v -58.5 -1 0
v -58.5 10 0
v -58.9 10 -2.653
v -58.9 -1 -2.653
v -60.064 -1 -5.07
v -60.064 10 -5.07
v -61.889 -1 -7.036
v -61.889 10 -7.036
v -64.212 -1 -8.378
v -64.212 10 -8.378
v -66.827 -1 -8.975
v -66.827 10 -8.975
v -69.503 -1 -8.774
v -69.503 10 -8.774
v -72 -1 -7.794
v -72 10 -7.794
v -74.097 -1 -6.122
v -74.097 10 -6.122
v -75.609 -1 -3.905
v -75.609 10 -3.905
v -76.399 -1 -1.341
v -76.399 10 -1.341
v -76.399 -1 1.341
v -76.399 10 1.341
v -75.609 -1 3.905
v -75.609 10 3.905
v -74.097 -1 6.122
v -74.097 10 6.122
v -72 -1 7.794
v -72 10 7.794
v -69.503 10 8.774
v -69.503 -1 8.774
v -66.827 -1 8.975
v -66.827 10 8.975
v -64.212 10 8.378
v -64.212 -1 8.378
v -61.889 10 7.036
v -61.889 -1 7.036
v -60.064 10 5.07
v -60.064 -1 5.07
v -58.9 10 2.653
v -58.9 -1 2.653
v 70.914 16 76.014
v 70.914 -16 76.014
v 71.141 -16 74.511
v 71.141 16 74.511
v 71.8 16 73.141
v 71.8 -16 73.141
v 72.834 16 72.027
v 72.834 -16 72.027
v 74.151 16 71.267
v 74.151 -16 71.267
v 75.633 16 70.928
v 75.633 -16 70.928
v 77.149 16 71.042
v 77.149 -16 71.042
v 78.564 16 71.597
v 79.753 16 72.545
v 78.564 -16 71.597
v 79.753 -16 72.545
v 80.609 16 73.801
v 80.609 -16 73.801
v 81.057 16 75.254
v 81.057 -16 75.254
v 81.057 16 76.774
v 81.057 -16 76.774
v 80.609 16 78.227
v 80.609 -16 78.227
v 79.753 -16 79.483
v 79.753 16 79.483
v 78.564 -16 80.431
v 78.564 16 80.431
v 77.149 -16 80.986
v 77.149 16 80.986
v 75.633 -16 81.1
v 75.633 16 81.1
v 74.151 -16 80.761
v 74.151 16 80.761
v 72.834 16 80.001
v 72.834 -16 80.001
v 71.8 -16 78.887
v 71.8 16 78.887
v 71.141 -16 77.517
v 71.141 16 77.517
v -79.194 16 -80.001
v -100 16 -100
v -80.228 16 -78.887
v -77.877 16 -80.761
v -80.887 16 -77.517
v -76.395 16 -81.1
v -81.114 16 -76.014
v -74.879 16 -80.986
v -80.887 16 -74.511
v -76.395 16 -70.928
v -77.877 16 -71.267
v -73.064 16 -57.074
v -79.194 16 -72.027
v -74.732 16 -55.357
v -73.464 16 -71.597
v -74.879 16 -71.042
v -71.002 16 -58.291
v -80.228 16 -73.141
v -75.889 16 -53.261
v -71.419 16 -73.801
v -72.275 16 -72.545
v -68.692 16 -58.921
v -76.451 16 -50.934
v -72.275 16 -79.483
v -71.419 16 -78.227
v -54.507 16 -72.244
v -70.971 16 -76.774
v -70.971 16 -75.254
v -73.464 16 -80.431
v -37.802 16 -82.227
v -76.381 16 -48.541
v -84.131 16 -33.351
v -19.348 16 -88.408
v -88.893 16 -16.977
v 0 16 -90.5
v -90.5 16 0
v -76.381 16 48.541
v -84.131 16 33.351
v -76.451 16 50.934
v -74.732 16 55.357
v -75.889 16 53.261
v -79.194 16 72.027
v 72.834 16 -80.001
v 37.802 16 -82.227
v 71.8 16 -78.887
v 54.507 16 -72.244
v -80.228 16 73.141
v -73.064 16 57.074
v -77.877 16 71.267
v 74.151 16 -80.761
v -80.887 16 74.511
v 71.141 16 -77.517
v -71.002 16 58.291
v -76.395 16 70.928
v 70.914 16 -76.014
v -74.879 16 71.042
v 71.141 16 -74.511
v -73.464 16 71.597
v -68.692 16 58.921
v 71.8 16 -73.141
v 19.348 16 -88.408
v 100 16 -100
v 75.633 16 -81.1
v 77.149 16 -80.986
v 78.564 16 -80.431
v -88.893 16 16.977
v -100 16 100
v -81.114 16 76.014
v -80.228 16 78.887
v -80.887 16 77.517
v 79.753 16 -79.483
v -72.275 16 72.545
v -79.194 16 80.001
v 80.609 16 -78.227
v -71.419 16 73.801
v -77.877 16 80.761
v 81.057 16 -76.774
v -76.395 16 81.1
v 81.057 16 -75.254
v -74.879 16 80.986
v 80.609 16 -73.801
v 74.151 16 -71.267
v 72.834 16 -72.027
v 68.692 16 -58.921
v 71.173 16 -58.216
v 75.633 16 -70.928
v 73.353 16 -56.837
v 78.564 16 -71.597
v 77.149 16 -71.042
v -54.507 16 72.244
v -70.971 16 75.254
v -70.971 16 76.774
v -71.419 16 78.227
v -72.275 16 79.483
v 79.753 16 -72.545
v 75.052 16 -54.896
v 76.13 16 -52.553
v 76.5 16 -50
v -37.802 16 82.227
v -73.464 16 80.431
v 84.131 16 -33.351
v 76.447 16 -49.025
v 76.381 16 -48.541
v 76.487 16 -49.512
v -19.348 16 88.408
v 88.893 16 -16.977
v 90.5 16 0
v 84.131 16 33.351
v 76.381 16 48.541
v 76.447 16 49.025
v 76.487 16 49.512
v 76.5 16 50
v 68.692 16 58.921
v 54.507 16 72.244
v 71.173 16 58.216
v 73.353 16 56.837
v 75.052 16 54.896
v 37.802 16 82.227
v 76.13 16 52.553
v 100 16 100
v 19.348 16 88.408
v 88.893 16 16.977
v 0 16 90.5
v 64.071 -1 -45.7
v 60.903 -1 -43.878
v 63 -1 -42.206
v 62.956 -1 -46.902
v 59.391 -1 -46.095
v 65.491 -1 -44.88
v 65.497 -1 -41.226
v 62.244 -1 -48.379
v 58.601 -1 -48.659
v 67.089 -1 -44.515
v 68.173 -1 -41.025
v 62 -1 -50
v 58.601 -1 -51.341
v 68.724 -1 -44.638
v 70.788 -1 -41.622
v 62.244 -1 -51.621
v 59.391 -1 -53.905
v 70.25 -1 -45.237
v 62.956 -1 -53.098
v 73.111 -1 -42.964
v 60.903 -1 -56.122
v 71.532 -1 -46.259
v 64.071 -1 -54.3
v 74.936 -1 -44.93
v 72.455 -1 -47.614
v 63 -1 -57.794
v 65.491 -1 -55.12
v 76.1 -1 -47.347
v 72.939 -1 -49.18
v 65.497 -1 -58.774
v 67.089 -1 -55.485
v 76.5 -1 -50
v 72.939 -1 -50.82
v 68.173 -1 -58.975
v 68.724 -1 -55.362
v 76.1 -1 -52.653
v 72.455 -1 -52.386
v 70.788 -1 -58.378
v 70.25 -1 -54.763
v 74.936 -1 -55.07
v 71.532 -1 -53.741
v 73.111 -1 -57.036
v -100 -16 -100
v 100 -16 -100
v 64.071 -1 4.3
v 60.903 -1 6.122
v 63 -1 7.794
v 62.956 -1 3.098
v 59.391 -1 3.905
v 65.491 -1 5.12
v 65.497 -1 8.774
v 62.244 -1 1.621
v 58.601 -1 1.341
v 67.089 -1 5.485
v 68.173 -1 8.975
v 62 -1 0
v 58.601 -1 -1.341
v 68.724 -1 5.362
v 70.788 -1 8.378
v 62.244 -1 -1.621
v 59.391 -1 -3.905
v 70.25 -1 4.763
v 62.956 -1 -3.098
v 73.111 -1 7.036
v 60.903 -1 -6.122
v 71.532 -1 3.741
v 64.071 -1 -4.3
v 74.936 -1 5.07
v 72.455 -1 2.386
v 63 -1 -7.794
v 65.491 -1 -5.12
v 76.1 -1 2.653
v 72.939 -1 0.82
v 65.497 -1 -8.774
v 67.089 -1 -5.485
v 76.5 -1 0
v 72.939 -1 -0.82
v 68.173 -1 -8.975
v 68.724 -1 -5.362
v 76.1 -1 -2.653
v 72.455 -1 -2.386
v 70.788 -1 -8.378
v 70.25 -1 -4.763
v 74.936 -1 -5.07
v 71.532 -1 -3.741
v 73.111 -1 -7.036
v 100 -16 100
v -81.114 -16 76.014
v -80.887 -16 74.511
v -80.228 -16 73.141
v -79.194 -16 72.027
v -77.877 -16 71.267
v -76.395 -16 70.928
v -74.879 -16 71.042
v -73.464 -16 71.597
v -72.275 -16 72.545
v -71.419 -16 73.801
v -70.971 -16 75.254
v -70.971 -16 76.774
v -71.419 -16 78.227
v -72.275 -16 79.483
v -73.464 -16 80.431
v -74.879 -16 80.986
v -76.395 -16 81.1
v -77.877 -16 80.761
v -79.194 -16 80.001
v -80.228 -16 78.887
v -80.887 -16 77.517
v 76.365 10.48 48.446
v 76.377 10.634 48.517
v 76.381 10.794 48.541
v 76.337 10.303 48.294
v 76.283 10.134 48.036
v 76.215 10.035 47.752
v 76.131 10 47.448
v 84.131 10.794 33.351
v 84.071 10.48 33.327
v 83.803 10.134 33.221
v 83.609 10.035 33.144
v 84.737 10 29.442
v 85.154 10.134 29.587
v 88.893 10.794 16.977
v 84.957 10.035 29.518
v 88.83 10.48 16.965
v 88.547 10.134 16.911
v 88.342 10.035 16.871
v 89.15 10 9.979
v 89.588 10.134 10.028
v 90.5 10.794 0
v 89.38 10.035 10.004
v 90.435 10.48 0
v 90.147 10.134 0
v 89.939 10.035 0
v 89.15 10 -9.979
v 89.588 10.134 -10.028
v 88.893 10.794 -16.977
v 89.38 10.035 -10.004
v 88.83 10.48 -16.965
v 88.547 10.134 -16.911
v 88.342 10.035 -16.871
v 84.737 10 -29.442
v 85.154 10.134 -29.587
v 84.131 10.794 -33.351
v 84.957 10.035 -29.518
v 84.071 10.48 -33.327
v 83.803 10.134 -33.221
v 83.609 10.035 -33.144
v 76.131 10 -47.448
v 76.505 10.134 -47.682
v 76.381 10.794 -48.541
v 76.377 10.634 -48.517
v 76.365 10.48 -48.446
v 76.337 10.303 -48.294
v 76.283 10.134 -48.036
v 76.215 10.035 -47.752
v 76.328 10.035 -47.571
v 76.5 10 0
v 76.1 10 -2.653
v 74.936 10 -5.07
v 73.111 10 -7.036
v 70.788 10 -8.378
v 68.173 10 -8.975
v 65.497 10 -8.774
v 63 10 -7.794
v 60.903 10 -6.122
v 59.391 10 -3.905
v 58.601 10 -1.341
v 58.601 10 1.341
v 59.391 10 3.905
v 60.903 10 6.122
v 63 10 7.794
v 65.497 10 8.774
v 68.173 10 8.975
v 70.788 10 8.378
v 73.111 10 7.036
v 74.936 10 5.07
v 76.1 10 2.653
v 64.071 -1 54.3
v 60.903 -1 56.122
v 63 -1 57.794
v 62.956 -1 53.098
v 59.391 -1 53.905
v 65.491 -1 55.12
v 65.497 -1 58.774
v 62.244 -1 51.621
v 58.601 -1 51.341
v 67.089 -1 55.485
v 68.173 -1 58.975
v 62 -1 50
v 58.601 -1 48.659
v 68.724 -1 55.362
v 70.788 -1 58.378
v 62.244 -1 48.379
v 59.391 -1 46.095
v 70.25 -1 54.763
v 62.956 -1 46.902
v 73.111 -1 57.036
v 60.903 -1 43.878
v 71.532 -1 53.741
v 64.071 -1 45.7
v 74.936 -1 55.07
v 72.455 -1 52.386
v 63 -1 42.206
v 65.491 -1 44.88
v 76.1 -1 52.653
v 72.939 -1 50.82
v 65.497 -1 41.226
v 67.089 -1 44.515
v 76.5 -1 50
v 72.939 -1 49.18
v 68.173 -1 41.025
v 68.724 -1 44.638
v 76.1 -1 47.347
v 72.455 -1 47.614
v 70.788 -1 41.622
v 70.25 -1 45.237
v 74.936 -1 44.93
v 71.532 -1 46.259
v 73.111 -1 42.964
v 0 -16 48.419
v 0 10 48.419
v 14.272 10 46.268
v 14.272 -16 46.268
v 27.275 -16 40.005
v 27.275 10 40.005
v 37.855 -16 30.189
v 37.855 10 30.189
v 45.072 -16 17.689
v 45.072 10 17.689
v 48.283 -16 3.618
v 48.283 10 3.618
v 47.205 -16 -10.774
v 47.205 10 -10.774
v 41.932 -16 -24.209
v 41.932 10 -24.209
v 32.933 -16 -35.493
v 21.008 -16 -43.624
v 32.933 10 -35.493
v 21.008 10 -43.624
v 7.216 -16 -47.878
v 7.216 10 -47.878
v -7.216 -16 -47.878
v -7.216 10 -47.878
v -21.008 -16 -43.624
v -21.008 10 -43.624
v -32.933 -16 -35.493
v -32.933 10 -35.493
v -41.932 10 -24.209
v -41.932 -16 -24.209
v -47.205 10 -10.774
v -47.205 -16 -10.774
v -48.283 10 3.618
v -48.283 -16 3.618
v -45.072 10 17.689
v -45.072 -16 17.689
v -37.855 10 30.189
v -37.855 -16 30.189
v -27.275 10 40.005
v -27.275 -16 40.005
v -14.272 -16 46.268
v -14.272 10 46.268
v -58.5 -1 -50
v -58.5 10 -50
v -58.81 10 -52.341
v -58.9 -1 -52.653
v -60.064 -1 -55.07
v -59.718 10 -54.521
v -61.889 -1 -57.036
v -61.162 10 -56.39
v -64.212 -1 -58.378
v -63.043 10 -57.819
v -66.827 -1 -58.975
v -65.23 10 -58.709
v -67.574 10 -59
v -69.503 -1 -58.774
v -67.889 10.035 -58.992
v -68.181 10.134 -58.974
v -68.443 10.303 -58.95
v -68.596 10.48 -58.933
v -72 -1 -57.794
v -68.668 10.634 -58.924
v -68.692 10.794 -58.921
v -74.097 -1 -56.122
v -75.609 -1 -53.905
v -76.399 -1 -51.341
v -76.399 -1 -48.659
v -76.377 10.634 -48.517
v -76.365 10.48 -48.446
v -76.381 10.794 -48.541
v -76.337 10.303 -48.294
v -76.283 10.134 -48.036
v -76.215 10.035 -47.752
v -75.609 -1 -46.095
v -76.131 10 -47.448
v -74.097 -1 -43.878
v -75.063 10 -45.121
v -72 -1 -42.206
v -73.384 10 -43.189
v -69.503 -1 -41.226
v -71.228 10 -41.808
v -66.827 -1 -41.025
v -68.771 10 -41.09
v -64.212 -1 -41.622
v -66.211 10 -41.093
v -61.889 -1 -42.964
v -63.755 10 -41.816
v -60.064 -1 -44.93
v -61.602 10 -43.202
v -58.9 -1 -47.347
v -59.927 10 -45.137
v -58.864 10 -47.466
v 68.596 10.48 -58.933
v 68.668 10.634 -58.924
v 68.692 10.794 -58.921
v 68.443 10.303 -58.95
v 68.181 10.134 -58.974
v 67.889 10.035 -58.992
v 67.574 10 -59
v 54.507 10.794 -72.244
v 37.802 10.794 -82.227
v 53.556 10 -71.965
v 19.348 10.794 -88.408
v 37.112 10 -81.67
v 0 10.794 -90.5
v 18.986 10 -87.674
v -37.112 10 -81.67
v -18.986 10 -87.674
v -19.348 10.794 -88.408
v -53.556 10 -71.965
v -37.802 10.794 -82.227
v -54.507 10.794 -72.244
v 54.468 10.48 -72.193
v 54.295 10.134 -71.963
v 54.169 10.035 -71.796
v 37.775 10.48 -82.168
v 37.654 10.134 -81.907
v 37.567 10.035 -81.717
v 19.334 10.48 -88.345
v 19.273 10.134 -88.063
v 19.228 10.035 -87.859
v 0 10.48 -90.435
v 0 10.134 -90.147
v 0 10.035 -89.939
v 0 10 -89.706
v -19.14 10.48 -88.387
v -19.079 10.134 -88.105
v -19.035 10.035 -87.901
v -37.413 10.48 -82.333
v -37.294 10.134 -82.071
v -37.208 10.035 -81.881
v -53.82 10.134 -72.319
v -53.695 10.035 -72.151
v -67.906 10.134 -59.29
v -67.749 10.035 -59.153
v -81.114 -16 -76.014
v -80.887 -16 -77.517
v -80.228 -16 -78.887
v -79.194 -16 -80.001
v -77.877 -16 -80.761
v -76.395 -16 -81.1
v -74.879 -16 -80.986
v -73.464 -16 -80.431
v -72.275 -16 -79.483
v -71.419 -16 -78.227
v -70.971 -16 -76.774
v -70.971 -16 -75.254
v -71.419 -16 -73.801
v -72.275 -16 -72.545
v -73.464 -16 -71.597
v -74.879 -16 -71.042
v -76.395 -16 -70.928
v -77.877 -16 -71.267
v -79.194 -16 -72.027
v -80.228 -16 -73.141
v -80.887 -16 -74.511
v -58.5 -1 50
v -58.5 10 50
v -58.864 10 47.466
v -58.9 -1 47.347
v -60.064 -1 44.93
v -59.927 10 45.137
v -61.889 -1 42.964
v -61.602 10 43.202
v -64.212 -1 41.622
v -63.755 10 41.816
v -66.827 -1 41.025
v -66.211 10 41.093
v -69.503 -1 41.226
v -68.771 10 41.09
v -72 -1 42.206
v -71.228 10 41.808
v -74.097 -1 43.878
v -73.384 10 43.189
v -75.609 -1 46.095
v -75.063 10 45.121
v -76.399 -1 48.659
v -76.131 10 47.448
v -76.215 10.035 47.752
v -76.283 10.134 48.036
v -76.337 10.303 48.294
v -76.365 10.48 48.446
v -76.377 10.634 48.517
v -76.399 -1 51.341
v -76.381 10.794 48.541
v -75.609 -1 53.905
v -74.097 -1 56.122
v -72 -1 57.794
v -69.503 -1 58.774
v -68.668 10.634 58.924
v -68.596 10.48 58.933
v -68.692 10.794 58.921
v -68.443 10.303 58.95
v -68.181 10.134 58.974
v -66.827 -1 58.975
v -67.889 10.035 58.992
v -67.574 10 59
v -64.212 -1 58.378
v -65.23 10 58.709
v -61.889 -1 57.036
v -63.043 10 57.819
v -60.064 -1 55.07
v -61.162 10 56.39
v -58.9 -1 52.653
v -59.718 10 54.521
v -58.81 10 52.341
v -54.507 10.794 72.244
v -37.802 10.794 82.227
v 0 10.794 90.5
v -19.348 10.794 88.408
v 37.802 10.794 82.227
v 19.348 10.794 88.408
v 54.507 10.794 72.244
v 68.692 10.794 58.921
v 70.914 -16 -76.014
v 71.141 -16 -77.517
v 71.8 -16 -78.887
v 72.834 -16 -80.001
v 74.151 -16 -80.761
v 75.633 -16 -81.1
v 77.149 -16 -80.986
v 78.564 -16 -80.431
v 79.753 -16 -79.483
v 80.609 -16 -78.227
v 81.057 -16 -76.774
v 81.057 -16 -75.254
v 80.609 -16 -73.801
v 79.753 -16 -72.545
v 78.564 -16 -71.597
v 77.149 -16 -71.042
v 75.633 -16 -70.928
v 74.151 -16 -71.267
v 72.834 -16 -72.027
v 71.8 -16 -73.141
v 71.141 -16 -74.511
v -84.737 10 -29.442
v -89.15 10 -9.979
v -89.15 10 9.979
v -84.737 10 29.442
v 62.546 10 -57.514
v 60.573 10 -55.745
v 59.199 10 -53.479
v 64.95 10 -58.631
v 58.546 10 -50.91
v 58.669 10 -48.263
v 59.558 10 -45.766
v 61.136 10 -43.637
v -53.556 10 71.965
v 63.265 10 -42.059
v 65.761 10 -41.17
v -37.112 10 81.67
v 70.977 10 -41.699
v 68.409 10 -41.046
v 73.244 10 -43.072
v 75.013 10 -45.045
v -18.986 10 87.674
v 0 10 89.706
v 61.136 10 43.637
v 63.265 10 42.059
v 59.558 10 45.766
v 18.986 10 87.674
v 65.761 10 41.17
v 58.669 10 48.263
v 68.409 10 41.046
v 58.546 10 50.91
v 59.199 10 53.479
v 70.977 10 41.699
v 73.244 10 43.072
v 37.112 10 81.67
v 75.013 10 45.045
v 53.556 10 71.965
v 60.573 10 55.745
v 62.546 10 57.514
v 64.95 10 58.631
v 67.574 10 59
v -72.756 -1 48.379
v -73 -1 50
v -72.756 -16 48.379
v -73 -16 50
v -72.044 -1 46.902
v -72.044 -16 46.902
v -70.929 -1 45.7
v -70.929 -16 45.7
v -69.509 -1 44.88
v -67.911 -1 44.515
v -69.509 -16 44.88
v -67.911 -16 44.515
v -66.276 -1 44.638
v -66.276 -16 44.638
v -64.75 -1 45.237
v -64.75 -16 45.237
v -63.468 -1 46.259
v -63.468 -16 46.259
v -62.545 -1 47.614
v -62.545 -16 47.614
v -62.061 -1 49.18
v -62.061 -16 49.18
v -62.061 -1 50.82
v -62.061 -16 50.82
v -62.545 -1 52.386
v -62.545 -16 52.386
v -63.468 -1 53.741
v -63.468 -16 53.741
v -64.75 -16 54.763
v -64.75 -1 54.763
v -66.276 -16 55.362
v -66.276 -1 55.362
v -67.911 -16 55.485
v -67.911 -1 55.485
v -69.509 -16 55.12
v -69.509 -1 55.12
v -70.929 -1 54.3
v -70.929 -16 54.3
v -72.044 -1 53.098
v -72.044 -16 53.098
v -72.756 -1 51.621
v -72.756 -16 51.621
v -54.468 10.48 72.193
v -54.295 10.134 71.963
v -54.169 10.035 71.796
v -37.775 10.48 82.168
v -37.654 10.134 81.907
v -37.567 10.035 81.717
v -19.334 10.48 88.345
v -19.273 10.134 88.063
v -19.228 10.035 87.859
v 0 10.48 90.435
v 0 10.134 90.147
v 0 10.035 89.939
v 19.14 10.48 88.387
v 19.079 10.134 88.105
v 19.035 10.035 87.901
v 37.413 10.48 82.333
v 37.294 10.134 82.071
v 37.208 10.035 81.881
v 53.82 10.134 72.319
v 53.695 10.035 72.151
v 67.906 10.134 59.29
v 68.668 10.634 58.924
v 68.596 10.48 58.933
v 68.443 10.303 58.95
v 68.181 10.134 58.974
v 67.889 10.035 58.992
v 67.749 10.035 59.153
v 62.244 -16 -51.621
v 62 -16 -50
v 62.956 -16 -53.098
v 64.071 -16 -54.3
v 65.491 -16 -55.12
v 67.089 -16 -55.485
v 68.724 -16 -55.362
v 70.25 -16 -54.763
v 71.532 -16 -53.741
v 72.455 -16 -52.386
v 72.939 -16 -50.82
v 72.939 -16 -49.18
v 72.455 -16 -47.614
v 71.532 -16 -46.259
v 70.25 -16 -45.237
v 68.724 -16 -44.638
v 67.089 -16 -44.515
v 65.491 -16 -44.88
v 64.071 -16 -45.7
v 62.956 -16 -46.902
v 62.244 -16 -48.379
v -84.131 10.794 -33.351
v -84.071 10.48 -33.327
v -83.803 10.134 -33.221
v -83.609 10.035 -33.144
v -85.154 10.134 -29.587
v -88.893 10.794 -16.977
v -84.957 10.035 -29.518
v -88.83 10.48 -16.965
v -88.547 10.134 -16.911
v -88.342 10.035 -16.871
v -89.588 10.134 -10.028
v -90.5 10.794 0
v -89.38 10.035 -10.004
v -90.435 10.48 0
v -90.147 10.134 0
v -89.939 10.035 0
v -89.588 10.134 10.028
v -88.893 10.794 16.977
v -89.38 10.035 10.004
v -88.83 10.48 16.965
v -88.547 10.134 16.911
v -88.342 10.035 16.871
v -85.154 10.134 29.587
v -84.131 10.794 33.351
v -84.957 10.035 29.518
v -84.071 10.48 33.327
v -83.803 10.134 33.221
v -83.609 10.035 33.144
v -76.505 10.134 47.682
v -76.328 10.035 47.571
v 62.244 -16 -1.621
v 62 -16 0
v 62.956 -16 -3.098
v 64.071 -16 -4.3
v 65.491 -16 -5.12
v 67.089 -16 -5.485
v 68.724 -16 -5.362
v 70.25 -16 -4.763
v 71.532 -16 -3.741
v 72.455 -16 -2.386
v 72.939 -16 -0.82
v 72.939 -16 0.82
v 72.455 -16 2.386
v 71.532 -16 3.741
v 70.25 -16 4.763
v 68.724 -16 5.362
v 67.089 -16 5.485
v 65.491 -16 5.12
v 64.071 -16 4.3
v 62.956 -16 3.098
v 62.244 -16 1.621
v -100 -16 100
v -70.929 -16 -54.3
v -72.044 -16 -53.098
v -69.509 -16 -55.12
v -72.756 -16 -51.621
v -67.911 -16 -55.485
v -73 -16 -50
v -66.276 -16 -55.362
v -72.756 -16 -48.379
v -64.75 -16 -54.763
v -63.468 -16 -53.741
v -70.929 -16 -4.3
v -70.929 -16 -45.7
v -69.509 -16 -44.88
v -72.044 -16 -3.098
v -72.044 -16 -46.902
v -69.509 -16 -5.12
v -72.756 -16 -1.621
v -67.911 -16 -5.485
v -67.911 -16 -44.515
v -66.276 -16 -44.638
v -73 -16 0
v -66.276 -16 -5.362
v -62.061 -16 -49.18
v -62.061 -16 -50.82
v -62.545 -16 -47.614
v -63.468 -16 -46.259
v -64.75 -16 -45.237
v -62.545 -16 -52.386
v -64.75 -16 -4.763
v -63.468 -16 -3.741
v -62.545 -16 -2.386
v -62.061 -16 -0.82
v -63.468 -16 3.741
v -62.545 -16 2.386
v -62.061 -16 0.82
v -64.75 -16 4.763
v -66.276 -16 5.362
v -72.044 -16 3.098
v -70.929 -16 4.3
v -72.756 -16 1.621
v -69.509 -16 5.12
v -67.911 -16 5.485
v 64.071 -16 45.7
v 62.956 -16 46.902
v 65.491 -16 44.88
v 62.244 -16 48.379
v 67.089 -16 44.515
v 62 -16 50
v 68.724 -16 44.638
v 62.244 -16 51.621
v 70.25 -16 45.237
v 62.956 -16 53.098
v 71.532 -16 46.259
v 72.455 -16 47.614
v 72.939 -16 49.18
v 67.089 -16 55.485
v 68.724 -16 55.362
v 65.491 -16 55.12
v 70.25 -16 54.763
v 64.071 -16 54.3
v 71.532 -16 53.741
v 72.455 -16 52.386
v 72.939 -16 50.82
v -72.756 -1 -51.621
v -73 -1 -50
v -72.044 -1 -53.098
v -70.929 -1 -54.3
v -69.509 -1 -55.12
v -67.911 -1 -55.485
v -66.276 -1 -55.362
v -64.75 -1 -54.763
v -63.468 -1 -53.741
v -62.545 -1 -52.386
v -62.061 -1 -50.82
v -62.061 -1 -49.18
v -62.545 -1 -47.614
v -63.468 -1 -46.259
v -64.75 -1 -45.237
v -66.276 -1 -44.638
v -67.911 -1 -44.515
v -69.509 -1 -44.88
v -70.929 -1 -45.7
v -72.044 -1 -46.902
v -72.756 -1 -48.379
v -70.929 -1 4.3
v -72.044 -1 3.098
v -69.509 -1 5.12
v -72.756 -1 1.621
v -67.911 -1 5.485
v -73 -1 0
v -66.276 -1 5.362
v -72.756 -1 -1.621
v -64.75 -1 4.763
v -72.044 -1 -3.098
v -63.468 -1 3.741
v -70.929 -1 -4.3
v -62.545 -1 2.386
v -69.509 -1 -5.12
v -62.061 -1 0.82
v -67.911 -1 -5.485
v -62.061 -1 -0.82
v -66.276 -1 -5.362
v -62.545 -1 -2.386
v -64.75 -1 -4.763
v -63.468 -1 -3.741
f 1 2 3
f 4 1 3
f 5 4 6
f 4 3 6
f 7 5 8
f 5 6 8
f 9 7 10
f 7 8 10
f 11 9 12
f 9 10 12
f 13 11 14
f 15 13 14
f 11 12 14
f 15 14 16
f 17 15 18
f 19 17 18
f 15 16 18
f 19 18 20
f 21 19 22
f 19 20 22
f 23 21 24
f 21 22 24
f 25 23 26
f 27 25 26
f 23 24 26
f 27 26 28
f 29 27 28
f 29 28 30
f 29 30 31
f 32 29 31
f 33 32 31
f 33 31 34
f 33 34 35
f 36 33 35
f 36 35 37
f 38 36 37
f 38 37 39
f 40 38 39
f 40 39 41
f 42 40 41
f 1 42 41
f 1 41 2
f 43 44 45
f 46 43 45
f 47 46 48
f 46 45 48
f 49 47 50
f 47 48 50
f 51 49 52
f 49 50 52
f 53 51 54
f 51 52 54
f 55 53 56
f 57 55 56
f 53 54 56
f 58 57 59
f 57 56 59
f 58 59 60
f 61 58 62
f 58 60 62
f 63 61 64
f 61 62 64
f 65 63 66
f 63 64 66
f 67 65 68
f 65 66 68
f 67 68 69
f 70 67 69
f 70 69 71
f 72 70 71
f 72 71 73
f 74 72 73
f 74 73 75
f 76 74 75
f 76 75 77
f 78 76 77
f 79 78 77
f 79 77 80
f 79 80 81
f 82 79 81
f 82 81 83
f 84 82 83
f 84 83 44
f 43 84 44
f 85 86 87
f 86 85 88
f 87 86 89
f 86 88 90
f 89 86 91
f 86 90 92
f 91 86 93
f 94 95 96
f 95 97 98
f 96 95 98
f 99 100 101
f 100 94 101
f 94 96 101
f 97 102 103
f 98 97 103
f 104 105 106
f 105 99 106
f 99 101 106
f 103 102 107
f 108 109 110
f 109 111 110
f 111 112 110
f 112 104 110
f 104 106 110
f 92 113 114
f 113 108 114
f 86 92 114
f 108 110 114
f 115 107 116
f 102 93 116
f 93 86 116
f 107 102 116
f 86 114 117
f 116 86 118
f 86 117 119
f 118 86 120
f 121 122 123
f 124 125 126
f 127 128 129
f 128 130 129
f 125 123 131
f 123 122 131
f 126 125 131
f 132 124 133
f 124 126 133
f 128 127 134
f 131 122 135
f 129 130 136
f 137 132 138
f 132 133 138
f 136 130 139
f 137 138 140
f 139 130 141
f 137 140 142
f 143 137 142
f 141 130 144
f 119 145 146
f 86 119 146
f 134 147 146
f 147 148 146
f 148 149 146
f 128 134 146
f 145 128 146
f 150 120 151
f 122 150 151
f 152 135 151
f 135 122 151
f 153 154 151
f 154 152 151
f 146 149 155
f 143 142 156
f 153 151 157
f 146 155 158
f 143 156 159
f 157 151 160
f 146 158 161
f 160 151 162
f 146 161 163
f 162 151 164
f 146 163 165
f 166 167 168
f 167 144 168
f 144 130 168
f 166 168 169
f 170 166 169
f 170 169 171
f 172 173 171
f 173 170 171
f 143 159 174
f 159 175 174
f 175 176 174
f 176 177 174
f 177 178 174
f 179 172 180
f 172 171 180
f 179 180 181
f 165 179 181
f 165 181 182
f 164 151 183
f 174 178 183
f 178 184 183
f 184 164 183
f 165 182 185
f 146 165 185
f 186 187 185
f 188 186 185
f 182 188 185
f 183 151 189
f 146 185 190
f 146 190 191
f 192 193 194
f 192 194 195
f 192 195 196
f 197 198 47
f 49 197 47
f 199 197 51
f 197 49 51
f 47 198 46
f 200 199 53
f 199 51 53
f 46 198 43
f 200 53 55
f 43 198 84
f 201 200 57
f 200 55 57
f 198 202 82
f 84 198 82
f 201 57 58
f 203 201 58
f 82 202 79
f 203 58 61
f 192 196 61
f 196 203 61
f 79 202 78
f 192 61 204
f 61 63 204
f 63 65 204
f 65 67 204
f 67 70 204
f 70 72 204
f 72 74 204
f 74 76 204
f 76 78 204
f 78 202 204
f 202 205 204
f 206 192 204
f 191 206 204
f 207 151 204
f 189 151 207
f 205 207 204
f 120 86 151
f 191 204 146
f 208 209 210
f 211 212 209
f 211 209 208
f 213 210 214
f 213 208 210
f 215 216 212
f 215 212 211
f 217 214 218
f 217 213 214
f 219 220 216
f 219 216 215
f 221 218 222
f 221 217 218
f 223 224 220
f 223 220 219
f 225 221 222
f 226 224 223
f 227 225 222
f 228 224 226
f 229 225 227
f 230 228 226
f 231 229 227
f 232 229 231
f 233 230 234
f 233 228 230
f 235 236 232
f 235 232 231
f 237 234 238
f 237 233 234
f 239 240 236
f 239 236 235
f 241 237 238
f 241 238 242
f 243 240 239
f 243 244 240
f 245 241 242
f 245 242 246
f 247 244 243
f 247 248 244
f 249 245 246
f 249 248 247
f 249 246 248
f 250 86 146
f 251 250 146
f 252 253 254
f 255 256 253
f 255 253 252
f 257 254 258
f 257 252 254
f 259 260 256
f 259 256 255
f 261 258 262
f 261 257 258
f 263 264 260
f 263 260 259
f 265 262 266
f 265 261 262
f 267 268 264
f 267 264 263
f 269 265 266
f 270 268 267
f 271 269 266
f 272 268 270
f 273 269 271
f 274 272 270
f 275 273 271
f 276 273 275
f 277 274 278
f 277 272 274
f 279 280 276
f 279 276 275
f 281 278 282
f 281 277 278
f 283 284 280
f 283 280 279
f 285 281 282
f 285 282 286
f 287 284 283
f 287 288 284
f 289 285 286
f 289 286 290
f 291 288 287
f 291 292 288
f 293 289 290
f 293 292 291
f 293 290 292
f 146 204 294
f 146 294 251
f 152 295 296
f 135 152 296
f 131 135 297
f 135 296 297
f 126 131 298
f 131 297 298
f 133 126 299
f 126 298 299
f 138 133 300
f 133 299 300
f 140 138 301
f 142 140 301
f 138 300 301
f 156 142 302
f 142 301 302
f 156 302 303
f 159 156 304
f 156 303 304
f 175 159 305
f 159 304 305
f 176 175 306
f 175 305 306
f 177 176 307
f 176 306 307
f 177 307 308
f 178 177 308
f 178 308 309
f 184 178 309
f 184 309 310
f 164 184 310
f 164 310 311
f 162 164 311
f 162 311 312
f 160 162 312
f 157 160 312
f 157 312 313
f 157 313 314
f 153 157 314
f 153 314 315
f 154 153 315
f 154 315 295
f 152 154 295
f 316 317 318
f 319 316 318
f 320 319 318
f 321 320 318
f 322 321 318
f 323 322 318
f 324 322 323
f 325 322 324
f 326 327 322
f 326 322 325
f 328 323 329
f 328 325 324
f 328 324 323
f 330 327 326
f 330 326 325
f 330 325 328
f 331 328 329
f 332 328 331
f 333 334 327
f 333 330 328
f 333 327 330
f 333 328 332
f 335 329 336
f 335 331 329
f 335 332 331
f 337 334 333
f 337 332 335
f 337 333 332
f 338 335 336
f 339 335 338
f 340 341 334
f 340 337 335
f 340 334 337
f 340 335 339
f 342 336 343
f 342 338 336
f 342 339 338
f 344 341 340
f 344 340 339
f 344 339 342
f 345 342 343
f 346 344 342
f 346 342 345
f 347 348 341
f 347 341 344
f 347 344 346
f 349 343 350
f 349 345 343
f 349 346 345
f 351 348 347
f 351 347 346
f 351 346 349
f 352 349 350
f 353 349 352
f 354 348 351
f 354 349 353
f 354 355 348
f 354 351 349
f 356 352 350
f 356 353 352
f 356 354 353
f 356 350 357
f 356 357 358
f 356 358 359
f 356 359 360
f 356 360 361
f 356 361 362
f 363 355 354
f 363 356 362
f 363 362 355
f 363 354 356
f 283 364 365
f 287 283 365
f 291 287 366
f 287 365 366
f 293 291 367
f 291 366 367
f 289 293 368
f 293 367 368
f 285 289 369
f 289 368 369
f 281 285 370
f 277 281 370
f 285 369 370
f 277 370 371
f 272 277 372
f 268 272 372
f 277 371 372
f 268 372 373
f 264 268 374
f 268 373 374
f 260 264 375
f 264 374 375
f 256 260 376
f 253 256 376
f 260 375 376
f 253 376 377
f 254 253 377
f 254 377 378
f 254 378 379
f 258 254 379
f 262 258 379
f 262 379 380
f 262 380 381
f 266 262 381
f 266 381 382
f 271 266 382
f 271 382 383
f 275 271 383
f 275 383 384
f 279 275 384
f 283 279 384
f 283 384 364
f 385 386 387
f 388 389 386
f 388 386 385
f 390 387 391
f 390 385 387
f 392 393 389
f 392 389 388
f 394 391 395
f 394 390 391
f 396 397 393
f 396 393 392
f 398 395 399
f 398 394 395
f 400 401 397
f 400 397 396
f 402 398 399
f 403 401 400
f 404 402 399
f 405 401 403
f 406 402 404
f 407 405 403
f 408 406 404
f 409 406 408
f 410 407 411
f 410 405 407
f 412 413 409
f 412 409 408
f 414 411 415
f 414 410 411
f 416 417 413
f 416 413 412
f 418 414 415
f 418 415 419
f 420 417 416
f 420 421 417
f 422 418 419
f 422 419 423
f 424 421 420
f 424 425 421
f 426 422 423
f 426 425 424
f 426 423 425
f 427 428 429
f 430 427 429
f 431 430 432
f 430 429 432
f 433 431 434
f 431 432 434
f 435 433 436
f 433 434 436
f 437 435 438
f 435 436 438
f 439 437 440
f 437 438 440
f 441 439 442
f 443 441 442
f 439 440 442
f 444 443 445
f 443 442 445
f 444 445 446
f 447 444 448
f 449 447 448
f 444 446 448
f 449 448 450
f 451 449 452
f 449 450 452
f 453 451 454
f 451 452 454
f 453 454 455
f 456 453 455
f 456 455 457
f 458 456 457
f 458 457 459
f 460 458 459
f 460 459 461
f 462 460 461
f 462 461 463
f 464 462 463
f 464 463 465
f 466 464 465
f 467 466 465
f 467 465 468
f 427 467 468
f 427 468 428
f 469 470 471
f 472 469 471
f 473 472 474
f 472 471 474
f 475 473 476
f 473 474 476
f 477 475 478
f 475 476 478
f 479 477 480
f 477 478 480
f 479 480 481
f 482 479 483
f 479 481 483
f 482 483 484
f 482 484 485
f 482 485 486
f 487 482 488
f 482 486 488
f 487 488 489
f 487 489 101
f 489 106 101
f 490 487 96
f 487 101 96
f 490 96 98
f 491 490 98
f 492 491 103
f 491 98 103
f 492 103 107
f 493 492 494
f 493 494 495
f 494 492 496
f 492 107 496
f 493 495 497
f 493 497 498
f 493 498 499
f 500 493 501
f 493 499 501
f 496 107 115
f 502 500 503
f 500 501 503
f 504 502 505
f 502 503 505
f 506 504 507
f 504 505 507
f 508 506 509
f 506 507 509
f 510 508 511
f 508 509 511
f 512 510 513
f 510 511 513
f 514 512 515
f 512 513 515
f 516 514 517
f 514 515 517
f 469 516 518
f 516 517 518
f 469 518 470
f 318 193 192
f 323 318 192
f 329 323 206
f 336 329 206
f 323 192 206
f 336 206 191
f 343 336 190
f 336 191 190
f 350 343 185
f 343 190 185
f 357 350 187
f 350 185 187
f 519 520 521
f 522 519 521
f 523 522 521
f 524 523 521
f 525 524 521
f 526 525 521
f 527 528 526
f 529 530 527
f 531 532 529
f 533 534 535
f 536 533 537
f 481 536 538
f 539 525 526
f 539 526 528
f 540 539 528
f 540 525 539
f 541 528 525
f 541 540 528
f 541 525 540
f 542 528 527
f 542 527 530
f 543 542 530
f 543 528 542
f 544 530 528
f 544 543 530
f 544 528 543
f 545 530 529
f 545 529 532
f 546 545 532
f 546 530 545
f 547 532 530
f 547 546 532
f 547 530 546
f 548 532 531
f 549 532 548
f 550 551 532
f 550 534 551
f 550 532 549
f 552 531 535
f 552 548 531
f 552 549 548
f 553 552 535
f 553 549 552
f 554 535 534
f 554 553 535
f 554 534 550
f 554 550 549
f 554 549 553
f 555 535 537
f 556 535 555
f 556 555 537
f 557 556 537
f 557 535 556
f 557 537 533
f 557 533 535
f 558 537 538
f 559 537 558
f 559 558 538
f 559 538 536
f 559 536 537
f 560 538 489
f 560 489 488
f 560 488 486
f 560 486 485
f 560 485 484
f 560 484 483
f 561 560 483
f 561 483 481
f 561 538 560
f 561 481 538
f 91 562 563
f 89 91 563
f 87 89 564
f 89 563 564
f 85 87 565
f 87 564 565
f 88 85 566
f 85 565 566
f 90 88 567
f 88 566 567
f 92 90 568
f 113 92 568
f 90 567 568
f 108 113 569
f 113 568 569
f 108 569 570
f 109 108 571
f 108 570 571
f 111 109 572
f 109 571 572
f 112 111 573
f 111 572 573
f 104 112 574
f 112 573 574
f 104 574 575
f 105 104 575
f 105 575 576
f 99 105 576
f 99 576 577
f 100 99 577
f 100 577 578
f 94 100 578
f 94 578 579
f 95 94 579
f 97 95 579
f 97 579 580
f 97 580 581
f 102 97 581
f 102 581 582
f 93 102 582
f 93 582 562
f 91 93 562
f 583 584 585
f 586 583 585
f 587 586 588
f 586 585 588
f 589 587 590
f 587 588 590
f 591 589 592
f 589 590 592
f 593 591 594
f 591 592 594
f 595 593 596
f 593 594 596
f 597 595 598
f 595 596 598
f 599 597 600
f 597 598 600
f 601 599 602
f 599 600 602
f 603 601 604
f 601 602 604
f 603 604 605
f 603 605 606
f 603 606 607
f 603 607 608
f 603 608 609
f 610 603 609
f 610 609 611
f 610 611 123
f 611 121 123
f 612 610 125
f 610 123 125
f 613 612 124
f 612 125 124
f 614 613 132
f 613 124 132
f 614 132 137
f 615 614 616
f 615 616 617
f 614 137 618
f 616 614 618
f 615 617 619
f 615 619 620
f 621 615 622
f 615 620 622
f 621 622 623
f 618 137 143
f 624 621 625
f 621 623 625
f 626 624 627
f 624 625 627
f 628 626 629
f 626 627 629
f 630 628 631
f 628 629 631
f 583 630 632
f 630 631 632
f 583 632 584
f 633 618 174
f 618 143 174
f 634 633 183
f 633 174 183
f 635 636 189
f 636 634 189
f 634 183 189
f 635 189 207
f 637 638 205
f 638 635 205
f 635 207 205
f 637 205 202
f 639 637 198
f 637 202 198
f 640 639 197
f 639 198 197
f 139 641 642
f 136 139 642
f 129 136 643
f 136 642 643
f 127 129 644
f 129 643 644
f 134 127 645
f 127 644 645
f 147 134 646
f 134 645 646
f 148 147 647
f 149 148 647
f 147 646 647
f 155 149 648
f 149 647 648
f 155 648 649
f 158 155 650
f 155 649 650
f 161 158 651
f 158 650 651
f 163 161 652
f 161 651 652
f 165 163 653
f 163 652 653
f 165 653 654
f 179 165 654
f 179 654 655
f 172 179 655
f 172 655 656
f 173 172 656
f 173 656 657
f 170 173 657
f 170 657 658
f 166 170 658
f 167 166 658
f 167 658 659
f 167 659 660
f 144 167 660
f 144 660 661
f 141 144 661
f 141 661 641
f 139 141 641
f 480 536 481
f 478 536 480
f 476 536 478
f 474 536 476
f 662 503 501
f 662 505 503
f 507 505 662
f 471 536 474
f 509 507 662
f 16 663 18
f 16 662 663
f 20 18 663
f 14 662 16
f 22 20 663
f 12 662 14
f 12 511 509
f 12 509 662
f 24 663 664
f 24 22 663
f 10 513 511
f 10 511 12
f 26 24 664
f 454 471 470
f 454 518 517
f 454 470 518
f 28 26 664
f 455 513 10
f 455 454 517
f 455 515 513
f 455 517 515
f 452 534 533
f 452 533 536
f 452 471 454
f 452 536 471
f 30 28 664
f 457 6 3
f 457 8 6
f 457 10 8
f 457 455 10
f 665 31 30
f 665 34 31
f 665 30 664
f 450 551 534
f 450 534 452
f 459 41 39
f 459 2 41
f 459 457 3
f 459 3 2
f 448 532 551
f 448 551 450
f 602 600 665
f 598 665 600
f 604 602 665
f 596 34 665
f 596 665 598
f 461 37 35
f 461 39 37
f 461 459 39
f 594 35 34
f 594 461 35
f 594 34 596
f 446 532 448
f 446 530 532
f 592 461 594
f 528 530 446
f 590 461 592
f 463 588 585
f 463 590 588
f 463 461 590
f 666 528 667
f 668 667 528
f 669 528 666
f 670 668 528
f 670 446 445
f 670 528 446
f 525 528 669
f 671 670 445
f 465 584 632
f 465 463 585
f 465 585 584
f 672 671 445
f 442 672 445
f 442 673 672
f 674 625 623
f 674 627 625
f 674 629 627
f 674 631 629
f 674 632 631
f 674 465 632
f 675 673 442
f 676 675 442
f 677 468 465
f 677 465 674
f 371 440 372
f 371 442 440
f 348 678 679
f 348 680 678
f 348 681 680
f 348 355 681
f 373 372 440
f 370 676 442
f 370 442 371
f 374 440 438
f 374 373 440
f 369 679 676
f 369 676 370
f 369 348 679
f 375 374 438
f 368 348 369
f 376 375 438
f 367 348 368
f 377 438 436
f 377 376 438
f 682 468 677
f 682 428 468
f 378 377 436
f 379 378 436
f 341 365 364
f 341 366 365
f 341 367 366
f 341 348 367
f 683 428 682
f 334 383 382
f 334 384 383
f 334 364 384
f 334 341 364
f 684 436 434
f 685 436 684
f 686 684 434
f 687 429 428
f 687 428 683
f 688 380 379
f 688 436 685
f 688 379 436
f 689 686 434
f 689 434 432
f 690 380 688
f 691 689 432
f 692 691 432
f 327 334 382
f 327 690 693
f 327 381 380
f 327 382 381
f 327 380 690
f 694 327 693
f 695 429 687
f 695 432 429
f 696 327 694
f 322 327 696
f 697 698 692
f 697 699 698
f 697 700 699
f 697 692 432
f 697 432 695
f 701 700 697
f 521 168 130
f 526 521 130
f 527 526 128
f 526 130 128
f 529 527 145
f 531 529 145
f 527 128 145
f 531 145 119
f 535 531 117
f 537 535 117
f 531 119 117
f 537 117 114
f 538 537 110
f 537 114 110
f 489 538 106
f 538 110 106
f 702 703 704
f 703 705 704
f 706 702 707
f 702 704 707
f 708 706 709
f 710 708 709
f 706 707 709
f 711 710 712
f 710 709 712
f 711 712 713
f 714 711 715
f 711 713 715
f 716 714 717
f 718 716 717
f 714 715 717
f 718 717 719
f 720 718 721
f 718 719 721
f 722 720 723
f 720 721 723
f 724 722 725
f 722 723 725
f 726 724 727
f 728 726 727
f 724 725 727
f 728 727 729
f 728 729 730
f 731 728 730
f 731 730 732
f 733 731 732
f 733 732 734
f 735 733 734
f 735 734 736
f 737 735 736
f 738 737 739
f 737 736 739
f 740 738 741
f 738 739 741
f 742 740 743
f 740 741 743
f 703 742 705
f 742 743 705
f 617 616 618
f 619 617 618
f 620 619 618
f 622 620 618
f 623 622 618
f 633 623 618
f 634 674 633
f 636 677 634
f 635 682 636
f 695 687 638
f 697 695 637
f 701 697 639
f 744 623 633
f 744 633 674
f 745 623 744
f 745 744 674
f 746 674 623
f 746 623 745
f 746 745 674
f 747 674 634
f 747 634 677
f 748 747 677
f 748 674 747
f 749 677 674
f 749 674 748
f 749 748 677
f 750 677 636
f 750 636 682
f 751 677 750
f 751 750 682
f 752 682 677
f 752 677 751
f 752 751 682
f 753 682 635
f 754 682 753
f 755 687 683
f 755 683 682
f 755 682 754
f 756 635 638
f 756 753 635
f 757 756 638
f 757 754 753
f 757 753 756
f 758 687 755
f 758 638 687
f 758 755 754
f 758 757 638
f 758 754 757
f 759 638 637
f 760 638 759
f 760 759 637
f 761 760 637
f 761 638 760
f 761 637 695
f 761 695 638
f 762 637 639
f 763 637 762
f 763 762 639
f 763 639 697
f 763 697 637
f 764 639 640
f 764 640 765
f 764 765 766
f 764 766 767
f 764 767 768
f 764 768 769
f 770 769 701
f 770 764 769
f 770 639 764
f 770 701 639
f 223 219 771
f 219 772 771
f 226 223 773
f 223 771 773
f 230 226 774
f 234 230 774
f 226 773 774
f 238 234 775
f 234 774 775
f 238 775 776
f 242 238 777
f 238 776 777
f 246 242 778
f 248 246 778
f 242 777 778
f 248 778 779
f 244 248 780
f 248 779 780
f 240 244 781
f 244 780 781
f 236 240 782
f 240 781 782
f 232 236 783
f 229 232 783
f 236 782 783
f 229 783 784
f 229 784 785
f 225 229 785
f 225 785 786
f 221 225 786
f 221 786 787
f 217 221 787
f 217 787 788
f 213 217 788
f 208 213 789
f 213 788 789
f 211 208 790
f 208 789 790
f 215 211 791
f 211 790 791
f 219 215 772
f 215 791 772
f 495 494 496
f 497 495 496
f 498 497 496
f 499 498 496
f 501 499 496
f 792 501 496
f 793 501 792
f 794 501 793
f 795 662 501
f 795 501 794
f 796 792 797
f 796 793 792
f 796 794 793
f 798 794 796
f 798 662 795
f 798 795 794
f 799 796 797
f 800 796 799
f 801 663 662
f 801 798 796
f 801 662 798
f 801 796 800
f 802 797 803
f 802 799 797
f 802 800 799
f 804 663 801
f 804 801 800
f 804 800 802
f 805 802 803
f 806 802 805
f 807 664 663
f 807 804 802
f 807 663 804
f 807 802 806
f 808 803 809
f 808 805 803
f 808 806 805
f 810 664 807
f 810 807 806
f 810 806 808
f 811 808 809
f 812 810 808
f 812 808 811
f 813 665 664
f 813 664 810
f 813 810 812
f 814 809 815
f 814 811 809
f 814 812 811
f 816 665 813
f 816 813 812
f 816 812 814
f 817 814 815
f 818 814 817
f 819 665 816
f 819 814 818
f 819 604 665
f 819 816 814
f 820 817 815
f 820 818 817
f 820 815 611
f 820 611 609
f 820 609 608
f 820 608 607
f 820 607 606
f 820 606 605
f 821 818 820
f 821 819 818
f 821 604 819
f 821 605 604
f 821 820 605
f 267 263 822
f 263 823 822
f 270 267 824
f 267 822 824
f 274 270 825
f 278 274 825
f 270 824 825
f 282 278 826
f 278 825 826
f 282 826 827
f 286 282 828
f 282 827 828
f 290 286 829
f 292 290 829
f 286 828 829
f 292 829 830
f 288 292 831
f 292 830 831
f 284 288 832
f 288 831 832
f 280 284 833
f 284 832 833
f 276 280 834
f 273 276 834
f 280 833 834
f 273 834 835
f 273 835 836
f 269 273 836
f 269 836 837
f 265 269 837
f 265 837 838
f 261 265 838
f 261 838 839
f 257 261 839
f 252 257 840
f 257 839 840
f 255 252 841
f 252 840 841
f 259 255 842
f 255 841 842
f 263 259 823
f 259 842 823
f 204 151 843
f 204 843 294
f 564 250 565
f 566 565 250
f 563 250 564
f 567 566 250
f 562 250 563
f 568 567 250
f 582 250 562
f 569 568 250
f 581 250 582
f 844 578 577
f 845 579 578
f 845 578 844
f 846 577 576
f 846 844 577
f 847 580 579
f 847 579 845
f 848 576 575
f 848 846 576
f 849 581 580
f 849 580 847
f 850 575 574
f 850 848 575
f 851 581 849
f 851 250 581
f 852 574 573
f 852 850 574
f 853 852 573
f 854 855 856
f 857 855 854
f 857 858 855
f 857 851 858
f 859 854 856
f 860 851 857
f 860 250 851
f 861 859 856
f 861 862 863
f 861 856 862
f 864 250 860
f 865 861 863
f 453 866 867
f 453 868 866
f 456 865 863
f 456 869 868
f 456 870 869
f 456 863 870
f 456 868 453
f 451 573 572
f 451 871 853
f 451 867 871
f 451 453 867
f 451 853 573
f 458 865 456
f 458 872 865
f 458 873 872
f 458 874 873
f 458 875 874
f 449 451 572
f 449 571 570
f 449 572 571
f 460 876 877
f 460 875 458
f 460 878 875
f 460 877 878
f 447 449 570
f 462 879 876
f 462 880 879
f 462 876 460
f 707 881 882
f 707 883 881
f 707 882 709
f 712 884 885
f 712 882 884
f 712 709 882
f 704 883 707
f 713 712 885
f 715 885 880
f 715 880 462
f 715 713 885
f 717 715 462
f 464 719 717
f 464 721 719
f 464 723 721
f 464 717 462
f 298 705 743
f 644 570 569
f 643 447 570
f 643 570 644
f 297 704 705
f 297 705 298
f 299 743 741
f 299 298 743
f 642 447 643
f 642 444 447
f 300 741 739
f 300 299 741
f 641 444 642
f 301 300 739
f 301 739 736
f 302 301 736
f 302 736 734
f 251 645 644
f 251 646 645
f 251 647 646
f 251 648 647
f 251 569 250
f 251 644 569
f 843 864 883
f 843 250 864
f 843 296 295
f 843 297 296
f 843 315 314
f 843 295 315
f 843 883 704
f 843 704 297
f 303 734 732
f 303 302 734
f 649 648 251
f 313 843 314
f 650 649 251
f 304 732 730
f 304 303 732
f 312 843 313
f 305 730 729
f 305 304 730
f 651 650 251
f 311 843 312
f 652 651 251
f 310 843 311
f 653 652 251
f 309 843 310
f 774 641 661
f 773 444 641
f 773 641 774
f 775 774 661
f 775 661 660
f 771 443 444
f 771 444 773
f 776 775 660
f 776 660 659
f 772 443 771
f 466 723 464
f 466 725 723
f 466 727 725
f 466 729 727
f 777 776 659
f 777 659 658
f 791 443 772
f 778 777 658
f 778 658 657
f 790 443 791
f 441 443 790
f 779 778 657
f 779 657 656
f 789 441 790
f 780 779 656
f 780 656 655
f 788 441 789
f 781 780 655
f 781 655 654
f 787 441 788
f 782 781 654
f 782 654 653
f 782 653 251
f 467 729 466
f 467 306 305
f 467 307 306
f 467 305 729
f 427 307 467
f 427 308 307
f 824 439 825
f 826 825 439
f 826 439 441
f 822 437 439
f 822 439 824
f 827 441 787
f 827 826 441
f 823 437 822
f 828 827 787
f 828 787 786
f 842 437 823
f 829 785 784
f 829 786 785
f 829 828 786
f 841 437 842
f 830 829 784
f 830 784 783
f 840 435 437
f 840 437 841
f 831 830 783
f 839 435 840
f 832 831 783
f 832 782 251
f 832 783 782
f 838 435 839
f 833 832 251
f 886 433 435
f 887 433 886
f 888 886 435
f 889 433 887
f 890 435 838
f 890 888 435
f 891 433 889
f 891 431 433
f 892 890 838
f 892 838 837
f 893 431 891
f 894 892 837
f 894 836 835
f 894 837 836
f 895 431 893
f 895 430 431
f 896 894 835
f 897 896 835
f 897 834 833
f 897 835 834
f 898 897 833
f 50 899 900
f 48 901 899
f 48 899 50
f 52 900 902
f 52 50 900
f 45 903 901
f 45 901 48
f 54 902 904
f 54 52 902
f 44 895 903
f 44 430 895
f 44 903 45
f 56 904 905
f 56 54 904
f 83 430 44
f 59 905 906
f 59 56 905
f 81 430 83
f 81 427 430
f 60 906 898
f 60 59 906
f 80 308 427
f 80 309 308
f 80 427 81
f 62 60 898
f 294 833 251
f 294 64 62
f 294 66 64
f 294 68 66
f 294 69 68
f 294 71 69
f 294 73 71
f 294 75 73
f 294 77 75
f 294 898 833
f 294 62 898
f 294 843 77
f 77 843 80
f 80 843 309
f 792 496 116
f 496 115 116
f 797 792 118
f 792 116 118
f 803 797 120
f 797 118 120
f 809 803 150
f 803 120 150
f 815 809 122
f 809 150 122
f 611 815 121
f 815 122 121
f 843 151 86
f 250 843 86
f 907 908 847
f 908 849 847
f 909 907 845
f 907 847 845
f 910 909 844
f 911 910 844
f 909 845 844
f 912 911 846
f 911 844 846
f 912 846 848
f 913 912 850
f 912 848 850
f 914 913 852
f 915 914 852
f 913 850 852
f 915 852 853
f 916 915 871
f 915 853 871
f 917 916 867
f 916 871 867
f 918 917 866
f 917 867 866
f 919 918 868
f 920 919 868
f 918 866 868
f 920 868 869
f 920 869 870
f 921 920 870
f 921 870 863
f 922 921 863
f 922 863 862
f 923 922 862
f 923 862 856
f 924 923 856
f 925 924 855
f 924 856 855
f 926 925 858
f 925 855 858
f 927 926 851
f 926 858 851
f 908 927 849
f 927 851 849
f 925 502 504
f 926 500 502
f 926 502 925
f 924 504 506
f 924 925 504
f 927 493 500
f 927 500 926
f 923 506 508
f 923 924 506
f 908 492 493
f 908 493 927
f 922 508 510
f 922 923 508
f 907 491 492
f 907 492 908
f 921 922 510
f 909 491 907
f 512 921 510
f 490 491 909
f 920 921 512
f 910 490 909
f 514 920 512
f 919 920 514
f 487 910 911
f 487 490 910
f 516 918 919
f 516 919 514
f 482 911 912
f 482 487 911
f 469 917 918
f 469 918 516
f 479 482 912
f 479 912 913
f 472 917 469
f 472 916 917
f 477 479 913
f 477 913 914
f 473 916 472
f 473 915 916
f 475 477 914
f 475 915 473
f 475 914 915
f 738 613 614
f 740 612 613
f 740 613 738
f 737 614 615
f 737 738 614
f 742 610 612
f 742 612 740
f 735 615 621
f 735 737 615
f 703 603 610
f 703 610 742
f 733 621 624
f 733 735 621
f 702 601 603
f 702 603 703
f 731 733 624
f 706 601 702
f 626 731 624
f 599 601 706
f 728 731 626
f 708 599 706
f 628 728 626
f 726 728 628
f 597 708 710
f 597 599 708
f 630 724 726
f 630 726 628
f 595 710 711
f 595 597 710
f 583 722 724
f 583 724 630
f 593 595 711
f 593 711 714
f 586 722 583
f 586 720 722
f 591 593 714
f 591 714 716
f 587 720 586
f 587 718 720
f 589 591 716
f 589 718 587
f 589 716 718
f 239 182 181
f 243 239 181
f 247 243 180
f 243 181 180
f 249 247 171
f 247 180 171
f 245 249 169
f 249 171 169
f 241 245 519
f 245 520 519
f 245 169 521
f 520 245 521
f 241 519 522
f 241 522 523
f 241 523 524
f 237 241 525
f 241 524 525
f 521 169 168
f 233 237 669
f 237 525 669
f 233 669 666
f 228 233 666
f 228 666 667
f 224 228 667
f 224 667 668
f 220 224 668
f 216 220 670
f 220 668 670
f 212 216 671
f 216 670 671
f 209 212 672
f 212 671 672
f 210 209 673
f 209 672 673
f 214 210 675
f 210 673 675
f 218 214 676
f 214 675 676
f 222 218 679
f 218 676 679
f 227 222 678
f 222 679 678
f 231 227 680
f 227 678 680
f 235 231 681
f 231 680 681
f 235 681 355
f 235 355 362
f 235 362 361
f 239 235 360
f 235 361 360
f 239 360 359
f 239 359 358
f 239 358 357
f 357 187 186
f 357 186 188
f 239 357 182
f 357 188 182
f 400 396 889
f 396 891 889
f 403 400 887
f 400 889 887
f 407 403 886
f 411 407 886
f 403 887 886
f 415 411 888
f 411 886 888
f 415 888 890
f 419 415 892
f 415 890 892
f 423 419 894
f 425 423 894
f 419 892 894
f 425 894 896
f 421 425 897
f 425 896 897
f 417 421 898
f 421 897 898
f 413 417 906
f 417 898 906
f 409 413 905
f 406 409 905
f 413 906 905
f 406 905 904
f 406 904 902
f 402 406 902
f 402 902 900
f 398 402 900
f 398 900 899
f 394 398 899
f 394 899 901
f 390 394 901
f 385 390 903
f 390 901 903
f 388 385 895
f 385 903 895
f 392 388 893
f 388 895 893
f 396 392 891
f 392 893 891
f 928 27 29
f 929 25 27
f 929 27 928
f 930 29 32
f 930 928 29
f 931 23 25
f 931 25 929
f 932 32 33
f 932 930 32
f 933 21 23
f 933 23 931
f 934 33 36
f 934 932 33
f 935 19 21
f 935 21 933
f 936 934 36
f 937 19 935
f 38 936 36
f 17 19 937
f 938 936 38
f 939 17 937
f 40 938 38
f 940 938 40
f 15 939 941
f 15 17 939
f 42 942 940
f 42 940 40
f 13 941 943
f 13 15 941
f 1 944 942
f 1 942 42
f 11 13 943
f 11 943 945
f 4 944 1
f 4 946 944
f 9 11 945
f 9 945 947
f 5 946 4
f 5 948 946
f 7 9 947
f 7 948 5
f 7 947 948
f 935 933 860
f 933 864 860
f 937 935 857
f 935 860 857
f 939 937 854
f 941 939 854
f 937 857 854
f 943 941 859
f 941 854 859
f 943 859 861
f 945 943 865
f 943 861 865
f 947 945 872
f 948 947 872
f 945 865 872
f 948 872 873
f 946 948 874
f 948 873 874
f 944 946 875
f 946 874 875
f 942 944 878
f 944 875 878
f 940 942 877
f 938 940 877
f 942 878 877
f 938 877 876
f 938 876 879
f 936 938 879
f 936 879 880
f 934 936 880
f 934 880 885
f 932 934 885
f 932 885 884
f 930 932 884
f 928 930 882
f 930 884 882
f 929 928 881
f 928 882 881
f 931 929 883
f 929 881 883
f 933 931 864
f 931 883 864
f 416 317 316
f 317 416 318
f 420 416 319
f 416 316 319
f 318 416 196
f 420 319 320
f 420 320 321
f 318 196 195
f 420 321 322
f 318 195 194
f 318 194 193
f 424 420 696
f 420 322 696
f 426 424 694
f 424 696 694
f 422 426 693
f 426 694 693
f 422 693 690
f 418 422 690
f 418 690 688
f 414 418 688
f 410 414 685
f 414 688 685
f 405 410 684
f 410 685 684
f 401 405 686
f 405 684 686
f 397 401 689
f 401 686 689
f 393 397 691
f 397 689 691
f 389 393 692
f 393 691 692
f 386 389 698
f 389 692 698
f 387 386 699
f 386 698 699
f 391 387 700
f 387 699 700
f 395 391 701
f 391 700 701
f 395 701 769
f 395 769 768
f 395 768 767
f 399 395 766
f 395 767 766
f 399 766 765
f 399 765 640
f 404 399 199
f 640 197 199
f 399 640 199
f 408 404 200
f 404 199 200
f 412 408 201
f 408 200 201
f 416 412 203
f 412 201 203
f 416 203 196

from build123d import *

# Parameters (mm, degrees)
SKETCH1_W                                            = 200
SKETCH1_H                                            = 200
BOSS_EXTRUDE1_DEPTH                                  = 19.05
SKETCH2_W                                            = 200
SKETCH2_H                                            = 3.05
CUT_EXTRUDE1_DEPTH                                   = 225.416805298
SKETCH3_R                                            = 90.5
CUT_EXTRUDE2_DEPTH                                   = 6
M12_TAPPED_HOLE1_D                                   = 10.2
M12_TAPPED_HOLE1_DEPTH                               = 32.75
M12_TAPPED_HOLE1_TIP                                 = 3.064389157
SKETCH6_R                                            = 48.41875
CUT_EXTRUDE3_DEPTH                                   = 144.791515744
FILLET1_R                                            = 0.79375
CBORE_FOR_M10_HEX_SOCKET_HEAD_CAP_SCREW1_D           = 11
CBORE_FOR_M10_HEX_SOCKET_HEAD_CAP_SCREW1_CBORE_D     = 18
CBORE_FOR_M10_HEX_SOCKET_HEAD_CAP_SCREW1_CBORE_DEPTH = 17


with BuildPart() as part:
    # Sketch1 → Boss-Extrude1 (new, symmetric)
    with BuildSketch(Plane(origin=(0, 0, 0), x_dir=(1, 0, 0), z_dir=(0, 1, 0))):
        Rectangle(SKETCH1_W, SKETCH1_H)
    extrude(amount=BOSS_EXTRUDE1_DEPTH, both=True)

    # Sketch2 → Cut-Extrude1 (cut, through all)
    with BuildSketch(Plane.XY.offset(100)):
        with Locations((0, 17.525)):
            Rectangle(SKETCH2_W, SKETCH2_H)
        with Locations((0, -17.525)):
            Rectangle(SKETCH2_W, SKETCH2_H)
    extrude(amount=-CUT_EXTRUDE1_DEPTH, mode=Mode.SUBTRACT)

    # Sketch3 → Cut-Extrude2 (cut)
    with BuildSketch(Plane(origin=(0, 16, 0), x_dir=(1, 0, 0), z_dir=(0, 1, 0))):
        with Locations(Location((0, 0, 0), (0, 0, 270))):
            Circle(SKETCH3_R)
    extrude(amount=-CUT_EXTRUDE2_DEPTH, mode=Mode.SUBTRACT)

    # M12 Tapped Hole1
    with Locations(Plane(origin=(0, 16, 0), x_dir=(1, 0, 0), z_dir=(0, 1, 0))):
        with Locations((-76.013978978, 76.013978978), (76.013978978, 76.013978978), (76.013978978, -76.013978978), (-76.013978978, -76.013978978)):
            Hole(M12_TAPPED_HOLE1_D / 2, depth=M12_TAPPED_HOLE1_DEPTH)
            with Locations((0, 0, -(M12_TAPPED_HOLE1_DEPTH + M12_TAPPED_HOLE1_TIP / 2))):  # 118° drill point
                Cone(0, M12_TAPPED_HOLE1_D / 2, M12_TAPPED_HOLE1_TIP, mode=Mode.SUBTRACT)

    # Sketch6 → Cut-Extrude3 (cut, through all)
    with BuildSketch(Plane(origin=(0, 10, 0), x_dir=(1, 0, 0), z_dir=(0, 1, 0))):
        with Locations(Location((0, 0, 0), (0, 0, 270))):
            Circle(SKETCH6_R)
    extrude(amount=-CUT_EXTRUDE3_DEPTH, mode=Mode.SUBTRACT)

    # Fillet1
    fillet1_edges = [part.edges().sort_by_distance(p)[0] for p in [
        (0, 10, -90.5),
    ]]
    fillet(fillet1_edges, radius=FILLET1_R)

    # CBORE for M10 Hex Socket Head Cap Screw1 (through all)
    with Locations(Plane(origin=(0, 16, 0), x_dir=(1, 0, 0), z_dir=(0, 1, 0))):
        with Locations((-67.5, -50), (-67.5, 0), (-67.5, 50), (67.5, 50), (67.5, 0), (67.5, -50)):
            CounterBoreHole(CBORE_FOR_M10_HEX_SOCKET_HEAD_CAP_SCREW1_D / 2, CBORE_FOR_M10_HEX_SOCKET_HEAD_CAP_SCREW1_CBORE_D / 2, CBORE_FOR_M10_HEX_SOCKET_HEAD_CAP_SCREW1_CBORE_DEPTH)


solid = part.part
